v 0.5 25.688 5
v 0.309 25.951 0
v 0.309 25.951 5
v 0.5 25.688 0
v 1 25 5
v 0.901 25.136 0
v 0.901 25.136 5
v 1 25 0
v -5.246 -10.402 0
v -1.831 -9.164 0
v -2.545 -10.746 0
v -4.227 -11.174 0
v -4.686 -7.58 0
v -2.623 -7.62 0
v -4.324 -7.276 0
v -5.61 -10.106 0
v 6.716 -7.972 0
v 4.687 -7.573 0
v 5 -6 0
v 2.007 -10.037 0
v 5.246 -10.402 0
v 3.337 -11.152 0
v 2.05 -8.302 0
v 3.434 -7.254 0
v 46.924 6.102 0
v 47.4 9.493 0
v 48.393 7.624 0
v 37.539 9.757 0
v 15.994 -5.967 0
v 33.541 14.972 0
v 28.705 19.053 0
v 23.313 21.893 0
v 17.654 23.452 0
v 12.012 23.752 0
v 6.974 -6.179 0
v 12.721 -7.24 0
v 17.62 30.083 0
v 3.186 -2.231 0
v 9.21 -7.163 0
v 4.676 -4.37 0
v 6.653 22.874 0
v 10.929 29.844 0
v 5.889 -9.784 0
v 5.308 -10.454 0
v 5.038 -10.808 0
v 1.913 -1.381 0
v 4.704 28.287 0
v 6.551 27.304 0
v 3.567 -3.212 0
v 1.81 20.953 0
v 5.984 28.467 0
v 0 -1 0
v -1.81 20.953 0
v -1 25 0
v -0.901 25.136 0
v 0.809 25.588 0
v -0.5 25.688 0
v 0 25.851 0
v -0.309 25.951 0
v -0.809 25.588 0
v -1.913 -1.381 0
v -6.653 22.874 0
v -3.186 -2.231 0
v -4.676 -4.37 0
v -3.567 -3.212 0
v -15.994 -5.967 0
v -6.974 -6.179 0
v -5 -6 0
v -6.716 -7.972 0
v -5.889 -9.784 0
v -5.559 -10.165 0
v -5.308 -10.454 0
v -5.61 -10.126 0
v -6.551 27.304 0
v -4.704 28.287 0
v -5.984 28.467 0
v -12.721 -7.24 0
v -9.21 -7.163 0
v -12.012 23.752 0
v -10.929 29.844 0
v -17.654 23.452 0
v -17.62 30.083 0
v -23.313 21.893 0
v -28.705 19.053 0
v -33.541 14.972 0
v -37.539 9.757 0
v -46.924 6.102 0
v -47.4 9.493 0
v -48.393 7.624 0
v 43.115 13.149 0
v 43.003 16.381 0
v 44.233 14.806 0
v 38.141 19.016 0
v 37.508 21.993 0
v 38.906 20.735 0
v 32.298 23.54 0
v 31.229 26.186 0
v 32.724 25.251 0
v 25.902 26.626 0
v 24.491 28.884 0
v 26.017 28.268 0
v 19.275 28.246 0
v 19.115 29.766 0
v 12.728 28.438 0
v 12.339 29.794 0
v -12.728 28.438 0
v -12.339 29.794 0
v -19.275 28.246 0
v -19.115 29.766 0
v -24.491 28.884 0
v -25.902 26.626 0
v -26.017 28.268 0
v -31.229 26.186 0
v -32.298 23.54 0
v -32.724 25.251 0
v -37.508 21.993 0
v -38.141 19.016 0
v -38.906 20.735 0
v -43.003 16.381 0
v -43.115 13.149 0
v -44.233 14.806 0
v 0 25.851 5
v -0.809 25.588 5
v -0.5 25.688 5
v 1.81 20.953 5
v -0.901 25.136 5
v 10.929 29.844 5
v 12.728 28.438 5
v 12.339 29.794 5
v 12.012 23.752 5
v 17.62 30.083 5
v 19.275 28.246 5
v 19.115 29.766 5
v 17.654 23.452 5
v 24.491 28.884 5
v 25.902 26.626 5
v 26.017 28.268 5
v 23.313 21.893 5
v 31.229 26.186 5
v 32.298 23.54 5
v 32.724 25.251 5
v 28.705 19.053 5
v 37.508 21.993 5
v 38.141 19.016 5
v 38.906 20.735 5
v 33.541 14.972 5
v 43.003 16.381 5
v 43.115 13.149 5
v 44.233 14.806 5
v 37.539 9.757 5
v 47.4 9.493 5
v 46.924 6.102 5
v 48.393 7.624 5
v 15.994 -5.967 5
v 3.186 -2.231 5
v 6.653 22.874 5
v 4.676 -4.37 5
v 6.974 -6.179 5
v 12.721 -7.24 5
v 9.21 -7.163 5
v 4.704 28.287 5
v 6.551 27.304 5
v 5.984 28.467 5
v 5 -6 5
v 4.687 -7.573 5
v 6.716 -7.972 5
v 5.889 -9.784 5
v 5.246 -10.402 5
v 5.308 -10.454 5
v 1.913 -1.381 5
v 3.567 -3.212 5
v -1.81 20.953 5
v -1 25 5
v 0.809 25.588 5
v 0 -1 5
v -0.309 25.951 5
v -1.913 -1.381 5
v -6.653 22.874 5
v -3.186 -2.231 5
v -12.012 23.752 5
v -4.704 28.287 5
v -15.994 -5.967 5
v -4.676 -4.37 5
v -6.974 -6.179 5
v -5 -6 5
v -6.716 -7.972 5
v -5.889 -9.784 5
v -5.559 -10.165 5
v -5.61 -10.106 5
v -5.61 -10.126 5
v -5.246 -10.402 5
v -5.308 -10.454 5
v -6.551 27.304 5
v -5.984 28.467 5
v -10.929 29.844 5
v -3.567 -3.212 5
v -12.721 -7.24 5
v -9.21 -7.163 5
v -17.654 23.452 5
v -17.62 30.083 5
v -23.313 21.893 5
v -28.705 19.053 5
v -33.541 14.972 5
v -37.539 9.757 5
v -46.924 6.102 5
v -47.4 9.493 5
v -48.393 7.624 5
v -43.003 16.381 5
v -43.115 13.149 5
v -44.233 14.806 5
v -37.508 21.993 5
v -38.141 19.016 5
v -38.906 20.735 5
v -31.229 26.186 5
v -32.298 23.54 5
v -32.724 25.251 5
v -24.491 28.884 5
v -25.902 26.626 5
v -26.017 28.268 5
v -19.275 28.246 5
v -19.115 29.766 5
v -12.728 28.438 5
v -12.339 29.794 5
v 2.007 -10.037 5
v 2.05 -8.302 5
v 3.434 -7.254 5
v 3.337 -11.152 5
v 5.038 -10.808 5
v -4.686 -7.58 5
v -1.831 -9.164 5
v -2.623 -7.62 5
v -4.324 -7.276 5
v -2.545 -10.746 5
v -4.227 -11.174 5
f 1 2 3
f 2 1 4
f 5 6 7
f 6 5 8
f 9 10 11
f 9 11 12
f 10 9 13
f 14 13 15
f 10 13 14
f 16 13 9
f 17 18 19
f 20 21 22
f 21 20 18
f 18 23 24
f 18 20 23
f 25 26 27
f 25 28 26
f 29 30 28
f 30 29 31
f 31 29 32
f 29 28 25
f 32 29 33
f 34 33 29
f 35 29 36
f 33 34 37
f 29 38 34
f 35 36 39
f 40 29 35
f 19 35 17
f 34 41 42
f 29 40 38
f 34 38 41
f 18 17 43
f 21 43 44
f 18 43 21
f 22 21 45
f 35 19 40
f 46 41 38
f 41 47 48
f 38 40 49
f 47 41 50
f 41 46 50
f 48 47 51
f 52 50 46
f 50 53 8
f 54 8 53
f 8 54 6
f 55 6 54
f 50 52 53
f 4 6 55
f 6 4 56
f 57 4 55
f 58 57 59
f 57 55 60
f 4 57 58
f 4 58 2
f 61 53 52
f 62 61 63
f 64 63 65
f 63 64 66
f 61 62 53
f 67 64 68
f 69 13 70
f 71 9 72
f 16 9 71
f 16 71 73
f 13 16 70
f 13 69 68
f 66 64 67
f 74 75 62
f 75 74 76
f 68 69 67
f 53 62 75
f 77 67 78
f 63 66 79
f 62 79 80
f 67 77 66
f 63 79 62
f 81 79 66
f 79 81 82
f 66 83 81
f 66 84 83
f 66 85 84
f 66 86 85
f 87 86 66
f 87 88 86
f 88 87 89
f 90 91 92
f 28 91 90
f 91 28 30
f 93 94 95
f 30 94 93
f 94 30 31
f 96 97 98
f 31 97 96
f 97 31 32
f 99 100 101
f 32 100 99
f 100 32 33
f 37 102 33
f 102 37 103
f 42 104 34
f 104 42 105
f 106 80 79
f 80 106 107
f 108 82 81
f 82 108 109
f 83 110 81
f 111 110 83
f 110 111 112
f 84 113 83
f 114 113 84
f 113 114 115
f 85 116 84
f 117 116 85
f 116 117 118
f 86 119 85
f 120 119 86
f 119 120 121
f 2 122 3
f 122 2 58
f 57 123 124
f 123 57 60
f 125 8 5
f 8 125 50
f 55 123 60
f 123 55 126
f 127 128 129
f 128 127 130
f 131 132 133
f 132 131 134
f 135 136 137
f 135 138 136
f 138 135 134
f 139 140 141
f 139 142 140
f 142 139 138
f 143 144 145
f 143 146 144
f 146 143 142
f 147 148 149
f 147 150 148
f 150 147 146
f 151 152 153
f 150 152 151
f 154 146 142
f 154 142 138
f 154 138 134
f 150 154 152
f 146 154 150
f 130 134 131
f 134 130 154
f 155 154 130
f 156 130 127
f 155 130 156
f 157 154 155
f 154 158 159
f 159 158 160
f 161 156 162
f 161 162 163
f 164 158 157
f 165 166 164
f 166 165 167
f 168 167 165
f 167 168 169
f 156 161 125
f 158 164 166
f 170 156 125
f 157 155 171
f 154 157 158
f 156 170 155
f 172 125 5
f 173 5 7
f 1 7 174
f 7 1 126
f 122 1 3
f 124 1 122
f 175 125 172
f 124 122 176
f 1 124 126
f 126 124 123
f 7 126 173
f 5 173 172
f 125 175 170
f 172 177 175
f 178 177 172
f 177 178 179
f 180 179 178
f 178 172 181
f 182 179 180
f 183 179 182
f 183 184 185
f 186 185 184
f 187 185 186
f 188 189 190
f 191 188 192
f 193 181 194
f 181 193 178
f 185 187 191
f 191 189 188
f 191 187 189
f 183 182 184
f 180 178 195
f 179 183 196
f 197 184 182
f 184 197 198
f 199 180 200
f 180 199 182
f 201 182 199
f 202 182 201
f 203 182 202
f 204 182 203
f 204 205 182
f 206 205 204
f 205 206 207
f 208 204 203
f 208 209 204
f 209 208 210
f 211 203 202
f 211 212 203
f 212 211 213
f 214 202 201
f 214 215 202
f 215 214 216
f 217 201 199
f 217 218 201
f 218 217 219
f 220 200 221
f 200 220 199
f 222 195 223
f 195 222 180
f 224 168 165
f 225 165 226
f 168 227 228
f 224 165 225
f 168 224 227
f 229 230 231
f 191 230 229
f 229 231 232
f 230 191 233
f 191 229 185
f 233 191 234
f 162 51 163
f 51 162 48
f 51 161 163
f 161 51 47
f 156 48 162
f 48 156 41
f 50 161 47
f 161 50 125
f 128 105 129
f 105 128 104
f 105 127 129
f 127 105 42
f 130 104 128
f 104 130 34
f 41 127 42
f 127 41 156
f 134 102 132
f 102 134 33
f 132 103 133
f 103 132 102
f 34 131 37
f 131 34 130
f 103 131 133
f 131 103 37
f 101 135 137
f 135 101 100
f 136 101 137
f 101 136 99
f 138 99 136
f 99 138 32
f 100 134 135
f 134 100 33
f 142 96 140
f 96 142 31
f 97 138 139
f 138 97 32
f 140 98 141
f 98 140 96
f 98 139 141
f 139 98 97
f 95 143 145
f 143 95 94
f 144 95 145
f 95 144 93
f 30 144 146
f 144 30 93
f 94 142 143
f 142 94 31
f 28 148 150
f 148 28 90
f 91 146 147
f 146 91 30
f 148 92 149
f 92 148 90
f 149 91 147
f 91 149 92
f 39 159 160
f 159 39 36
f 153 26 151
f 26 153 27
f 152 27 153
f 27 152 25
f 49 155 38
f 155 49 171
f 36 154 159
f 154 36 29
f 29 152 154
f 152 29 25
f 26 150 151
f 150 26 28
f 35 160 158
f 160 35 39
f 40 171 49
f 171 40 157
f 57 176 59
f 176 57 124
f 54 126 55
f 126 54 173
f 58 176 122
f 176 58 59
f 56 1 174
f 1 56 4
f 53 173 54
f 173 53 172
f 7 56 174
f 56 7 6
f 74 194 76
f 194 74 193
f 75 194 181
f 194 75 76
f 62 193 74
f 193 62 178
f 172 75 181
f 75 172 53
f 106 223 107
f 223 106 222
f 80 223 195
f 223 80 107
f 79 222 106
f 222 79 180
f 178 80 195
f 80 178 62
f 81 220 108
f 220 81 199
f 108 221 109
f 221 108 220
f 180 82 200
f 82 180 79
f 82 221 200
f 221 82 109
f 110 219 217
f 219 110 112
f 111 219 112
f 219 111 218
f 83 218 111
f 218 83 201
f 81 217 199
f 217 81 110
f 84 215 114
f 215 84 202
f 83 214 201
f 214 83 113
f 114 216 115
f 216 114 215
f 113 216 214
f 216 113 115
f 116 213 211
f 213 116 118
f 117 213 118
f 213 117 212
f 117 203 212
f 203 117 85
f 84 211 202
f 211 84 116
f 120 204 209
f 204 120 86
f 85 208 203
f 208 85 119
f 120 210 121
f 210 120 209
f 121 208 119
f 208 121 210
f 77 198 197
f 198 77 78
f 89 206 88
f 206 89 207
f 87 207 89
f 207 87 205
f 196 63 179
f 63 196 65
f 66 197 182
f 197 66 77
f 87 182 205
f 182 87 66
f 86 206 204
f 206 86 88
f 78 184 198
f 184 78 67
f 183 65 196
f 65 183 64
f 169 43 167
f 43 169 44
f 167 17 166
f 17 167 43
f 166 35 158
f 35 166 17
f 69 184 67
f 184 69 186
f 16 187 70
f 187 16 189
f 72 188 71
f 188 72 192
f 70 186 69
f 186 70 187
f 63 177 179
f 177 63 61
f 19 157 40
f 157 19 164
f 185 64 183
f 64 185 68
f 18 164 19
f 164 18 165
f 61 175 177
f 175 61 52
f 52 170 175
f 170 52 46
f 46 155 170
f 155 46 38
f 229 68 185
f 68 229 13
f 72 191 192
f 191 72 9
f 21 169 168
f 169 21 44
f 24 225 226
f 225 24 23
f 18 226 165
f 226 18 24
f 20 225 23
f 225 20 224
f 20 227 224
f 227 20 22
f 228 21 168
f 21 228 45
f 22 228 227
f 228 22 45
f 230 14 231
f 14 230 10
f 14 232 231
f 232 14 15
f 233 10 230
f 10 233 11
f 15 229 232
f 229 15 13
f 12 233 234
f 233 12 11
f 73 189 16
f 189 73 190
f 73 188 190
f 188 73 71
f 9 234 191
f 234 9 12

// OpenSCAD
//Displays a 30cm long ruler
showruler = "no"; //["yes","no"]
rulerheight = 2; 
rulerlenght = 300; 

//Pattern-Element parameter 1
circle_1 = 5;//[1:100]
//Pattern-Element parameter 2
circle_2 = 1;//[1:100]
//Pattern-Element parameter 3
lenght = 20;//[1:100]
//Height of the moustache
height = 5;//[1:100]

//How often the element is repeated per side
repeat = 8;//[0:100]
//shift in x direction (10 = 1mm)(elementnumber*x)
shift_x = 2;//[-100:100]
//shift in y direction (10 = 1mm)(elementnumber*y)
shift_y = 5;//[-100:100]
//rotation of elements (elementnumber*rotation)
rotate = 10;//[0:360]
//scale of elements (elementnumber*scale)
scale =1;//[-100:100]


//Noseclip-Parameter: Angle the noseclip is open
noseclip_openingangle = 100;//[0:180]
//Noseclip-Parameter: diameter of the noseclip
noseclip_diameter = 10;//[0:180]
//Noseclip-Parameter: wallthickness of the noseclip
noseclip_wallthickness = 2;//[0:180]
//Noseclip-Parameter: radius of the little circles at the end of the noseclip
noseclip_endcircle = 2;//[0:180]
//Noseclip-Parameter: shift in x direction
noseclip_x = 0;//[-100:100]
//Noseclip-Parameter: shift in y direction
noseclip_y = -6;//[-100:100]

realshift_x = shift_x/10;
realshift_y = shift_y/10;
realscale = scale/10;





if(showruler == "yes"){
	ruler();
}
full(circle_1,circle_2,lenght,height);
noseclip();


module ruler(){
	translate([0,-noseclip_diameter,rulerheight + height]){
		difference(){
			cube([rulerlenght,10,rulerheight], center = true);
			for(i=[0:30]){
				translate([(i*10)-150,0,0]){
					cube([1,5,rulerheight+2], center = true);
				}
			}
		}
	}
}


module noseclip(){
translate([noseclip_x,noseclip_y,height/2]){
	difference(){
		union(){
			cylinder(h = height, r = noseclip_diameter/2+noseclip_wallthickness, center = true);
			
		}
		cylinder(h = height+2, r = noseclip_diameter/2, center = true);	
		rotate(180+90 + noseclip_openingangle/2) 
			linear_extrude(height = height+2, center = true)
				slice(noseclip_diameter*2, noseclip_openingangle);
	}
rotate(noseclip_openingangle/2) 
	translate([0,-noseclip_diameter/2,0]){
		cylinder(h = height, r = noseclip_endcircle, center = true);
	}

rotate(-noseclip_openingangle/2) 
	translate([0,-noseclip_diameter/2,0]){
		cylinder(h = height, r = noseclip_endcircle, center = true);
	}
}
}


module slice(r = 10, deg = 30) { 
	degn = (deg % 360 > 0) ? deg % 360 : deg % 360 + 360;
	difference() {
		circle(r);
		if (degn > 180) 
			intersection_for(a = [0, 180 - degn]) 
				rotate(a) 
					translate([-r, 0, 0]) 
						square(r * 2); 
		else 
			union() 
				for(a = [0, 180 - degn]) 
					rotate(a) 
						translate([-r, 0, 0]) 
							square(r * 2); 
	}
}

module full() {
	half(circle_1,circle_2,lenght,height);
	mirror([ 1, 0, 0 ])
		half(circle_1,circle_2,lenght,height);
}



module half() {
	for(i=[0:repeat]){
		translate([i*realshift_x,i* realshift_y, 0]){
			rotate([0,0,i*-rotate]){
				translate([-circle_1,0,0]){
					scale(v = [(i*realscale)+1,(i*realscale)+1, 1])
						element(circle_1,circle_2,lenght,height);
				}
			}
		}
	}
}


module element(circle_1,circle_2,lenght,height) {
 linear_extrude(height=height)
 	hull() {
 		translate([circle_1, circle_1, 0])
 			circle(r=circle_1,center = true);
 		translate([circle_1 ,  circle_1+ lenght, 0])
 			circle(r=circle_2,center = true);
 	}
}
